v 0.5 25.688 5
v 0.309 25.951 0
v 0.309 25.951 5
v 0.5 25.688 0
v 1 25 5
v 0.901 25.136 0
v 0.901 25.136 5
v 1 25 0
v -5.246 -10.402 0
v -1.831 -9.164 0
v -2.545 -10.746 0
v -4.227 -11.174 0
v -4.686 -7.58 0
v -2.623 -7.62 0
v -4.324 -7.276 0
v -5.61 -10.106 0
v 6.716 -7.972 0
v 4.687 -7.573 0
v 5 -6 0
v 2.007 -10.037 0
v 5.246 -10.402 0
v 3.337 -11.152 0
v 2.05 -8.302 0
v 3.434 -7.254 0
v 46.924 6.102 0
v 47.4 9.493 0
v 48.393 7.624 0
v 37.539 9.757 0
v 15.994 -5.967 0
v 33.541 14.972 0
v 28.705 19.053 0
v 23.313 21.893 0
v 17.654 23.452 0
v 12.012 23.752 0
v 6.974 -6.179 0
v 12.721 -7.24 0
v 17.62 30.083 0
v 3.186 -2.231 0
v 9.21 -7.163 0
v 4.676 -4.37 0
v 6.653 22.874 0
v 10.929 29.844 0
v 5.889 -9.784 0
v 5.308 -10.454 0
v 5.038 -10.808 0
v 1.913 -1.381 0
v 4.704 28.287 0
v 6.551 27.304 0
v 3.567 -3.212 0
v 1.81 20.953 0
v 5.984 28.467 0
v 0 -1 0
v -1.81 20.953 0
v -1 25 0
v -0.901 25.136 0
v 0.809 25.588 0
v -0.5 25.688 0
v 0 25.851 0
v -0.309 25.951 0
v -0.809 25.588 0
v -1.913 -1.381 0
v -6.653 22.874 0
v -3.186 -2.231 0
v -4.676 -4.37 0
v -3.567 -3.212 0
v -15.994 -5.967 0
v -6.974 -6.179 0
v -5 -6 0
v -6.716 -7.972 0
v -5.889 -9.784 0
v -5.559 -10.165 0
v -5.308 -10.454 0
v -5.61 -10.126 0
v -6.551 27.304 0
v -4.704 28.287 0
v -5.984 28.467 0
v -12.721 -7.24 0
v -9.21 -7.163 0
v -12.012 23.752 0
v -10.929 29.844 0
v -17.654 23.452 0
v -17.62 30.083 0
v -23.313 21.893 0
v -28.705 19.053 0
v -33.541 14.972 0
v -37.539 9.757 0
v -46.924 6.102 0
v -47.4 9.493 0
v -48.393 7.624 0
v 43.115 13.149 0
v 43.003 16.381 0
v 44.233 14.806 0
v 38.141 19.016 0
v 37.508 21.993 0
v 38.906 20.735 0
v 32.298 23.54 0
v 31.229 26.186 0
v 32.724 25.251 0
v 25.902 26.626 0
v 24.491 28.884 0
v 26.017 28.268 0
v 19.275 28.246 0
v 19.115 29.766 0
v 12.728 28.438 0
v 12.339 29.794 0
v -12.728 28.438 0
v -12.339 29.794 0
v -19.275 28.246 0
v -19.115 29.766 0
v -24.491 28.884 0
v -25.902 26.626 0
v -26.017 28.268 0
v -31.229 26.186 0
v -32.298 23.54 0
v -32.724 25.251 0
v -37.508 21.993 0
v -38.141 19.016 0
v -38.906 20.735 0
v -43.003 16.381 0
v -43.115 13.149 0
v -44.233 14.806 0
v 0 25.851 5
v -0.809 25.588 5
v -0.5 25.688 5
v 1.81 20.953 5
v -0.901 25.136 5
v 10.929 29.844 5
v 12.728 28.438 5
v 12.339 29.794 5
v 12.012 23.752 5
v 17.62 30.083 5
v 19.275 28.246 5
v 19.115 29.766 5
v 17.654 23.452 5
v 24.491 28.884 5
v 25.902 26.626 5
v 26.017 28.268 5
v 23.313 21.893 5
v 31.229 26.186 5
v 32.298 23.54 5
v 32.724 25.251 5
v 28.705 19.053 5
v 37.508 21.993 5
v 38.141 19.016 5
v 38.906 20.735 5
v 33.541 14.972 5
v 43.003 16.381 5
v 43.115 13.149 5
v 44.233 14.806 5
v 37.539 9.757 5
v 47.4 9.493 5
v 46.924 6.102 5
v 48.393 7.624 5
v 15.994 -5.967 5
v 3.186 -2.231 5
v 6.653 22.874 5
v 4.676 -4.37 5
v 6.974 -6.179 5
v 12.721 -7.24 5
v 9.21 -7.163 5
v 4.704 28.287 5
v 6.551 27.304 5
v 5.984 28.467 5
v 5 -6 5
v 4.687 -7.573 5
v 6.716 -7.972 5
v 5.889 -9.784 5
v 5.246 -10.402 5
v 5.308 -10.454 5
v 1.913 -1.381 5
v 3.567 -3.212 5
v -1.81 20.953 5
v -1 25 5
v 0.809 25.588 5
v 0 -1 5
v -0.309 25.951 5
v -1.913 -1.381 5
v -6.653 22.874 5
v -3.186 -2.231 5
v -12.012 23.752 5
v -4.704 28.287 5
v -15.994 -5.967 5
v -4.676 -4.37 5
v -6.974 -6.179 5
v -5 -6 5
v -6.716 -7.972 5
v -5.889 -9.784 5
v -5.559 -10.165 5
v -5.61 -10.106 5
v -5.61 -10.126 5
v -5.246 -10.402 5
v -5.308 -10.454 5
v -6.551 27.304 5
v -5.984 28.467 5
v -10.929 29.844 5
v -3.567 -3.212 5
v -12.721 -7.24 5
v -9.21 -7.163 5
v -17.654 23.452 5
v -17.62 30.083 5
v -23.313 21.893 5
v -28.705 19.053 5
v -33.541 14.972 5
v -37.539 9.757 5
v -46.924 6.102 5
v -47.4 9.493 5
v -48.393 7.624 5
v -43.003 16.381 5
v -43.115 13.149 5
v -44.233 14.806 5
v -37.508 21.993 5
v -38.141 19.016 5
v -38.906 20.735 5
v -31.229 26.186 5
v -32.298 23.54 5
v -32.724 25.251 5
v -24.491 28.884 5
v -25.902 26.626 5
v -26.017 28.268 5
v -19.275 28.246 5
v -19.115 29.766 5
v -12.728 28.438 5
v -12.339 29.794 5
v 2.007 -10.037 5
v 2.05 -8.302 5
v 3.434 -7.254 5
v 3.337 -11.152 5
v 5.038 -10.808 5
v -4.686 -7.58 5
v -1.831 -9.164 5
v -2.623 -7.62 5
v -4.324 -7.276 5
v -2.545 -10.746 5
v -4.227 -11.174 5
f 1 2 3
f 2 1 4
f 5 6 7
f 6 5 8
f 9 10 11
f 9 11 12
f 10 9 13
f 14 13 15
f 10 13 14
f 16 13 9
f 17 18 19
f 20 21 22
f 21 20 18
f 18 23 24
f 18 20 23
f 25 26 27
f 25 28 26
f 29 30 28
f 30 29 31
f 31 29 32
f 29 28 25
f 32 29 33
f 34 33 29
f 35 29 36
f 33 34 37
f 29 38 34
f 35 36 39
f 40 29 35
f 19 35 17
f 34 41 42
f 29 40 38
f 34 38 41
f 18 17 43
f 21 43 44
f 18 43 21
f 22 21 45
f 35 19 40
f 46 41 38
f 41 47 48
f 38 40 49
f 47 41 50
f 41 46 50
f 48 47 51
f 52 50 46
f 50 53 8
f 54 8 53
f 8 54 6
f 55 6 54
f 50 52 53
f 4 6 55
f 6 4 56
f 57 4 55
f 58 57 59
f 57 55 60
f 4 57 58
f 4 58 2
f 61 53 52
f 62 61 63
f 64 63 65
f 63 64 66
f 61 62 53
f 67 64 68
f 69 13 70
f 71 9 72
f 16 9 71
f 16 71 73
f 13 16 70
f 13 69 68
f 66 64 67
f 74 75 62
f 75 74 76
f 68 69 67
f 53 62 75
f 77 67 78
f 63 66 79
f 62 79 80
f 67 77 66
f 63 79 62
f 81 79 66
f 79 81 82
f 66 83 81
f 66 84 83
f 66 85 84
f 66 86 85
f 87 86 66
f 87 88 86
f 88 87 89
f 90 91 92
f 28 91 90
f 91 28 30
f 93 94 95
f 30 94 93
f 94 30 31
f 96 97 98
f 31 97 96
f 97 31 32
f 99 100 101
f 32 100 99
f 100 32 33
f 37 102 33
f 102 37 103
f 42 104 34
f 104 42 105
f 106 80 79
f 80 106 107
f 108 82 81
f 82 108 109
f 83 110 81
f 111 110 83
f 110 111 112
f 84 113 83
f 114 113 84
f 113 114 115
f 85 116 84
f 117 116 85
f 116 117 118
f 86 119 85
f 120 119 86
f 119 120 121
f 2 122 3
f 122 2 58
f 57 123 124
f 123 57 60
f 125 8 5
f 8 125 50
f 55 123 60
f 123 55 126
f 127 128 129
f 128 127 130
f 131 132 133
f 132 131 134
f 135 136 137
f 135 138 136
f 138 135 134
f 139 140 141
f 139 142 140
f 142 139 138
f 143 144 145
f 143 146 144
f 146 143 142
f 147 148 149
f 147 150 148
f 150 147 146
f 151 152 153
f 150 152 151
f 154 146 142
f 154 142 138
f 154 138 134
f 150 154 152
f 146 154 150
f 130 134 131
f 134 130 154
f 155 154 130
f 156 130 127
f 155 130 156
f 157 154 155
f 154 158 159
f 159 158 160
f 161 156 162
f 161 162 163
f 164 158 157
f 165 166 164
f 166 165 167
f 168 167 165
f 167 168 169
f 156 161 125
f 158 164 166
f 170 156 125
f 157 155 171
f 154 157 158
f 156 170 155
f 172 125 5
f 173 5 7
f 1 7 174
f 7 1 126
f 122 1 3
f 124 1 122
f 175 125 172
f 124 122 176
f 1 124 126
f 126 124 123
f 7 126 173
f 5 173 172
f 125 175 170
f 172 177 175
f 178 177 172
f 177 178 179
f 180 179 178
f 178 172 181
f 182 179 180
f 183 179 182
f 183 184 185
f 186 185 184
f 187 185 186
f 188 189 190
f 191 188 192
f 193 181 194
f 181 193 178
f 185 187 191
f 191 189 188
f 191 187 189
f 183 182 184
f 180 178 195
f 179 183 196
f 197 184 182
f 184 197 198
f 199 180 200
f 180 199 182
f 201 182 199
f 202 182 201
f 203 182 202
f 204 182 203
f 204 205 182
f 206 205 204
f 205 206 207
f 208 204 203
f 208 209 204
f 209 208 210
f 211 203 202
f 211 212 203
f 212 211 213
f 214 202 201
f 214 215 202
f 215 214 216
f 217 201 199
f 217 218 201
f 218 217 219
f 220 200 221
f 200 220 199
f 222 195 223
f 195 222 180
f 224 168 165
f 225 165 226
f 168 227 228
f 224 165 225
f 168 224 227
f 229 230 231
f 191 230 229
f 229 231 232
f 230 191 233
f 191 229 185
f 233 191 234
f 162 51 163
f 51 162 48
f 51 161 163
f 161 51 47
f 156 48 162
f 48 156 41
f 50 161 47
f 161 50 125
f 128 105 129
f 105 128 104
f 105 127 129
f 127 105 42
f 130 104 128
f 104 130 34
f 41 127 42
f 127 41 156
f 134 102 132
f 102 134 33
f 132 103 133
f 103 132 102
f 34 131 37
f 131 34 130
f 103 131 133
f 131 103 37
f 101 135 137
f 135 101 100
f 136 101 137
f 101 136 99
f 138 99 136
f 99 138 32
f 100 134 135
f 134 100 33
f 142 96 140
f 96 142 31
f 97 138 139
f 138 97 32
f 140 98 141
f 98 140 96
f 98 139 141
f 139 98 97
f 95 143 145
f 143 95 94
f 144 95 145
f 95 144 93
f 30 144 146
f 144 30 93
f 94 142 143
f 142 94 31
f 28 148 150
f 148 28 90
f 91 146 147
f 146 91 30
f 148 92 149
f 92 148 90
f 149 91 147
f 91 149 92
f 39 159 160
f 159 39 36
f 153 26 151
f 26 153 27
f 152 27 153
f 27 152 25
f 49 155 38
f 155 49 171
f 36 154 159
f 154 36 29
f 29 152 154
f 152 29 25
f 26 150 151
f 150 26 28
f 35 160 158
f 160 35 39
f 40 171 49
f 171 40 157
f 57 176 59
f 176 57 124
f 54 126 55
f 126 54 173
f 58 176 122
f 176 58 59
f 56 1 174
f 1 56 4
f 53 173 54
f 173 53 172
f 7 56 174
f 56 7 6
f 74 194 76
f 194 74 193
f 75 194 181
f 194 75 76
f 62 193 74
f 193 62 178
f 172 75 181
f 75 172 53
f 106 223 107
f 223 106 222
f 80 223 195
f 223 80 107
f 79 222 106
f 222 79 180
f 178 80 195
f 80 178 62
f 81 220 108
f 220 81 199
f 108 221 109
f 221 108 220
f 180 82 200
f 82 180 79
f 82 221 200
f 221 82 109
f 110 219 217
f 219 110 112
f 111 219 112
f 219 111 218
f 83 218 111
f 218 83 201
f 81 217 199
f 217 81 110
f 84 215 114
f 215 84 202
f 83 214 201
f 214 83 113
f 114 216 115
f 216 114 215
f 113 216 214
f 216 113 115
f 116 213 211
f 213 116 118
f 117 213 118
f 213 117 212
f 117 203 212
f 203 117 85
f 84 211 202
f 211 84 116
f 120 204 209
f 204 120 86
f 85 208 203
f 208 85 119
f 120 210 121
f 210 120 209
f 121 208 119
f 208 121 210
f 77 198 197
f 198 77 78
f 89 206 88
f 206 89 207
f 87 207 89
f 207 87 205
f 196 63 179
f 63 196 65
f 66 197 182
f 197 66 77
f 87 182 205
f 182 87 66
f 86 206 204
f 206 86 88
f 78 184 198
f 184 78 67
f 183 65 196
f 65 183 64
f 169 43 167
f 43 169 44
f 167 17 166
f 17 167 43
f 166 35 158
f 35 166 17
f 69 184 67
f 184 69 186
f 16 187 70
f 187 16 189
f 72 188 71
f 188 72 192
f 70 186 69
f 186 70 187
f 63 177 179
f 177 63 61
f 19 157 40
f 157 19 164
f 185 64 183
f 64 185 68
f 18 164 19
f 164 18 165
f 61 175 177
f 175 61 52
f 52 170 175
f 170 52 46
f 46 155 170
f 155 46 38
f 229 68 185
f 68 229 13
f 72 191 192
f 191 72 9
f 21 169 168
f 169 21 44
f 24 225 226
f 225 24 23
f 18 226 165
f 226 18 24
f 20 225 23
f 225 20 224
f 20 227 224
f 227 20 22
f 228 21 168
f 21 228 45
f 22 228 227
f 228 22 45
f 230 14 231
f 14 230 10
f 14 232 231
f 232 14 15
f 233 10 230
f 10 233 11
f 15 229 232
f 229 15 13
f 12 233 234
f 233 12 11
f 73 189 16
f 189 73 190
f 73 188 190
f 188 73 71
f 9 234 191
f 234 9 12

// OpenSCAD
//Displays a 30cm long ruler
showruler = "no"; //["yes","no"]
rulerheight = 2; 
rulerlenght = 300; 

//Pattern-Element parameter 1
circle_1 = 5;//[1:100]
//Pattern-Element parameter 2
circle_2 = 1;//[1:100]
//Pattern-Element parameter 3
lenght = 20;//[1:100]
//Height of the moustache
height = 5;//[1:100]

//How often the element is repeated per side
repeat = 8;//[0:100]
//shift in x direction (10 = 1mm)(elementnumber*x)
shift_x = 2;//[-100:100]
//shift in y direction (10 = 1mm)(elementnumber*y)
shift_y = 5;//[-100:100]
//rotation of elements (elementnumber*rotation)
rotate = 10;//[0:360]
//scale of elements (elementnumber*scale)
scale =1;//[-100:100]


//Noseclip-Parameter: Angle the noseclip is open
noseclip_openingangle = 100;//[0:180]
//Noseclip-Parameter: diameter of the noseclip
noseclip_diameter = 10;//[0:180]
//Noseclip-Parameter: wallthickness of the noseclip
noseclip_wallthickness = 2;//[0:180]
//Noseclip-Parameter: radius of the little circles at the end of the noseclip
noseclip_endcircle = 2;//[0:180]
//Noseclip-Parameter: shift in x direction
noseclip_x = 0;//[-100:100]
//Noseclip-Parameter: shift in y direction
noseclip_y = -6;//[-100:100]

realshift_x = shift_x/10;
realshift_y = shift_y/10;
realscale = scale/10;





if(showruler == "yes"){
	ruler();
}
full(circle_1,circle_2,lenght,height);
noseclip();


module ruler(){
	translate([0,-noseclip_diameter,rulerheight + height]){
		difference(){
			cube([rulerlenght,10,rulerheight], center = true);
			for(i=[0:30]){
				translate([(i*10)-150,0,0]){
					cube([1,5,rulerheight+2], center = true);
				}
			}
		}
	}
}


module noseclip(){
translate([noseclip_x,noseclip_y,height/2]){
	difference(){
		union(){
			cylinder(h = height, r = noseclip_diameter/2+noseclip_wallthickness, center = true);
			
		}
		cylinder(h = height+2, r = noseclip_diameter/2, center = true);	
		rotate(180+90 + noseclip_openingangle/2) 
			linear_extrude(height = height+2, center = true)
				slice(noseclip_diameter*2, noseclip_openingangle);
	}
rotate(noseclip_openingangle/2) 
	translate([0,-noseclip_diameter/2,0]){
		cylinder(h = height, r = noseclip_endcircle, center = true);
	}

rotate(-noseclip_openingangle/2) 
	translate([0,-noseclip_diameter/2,0]){
		cylinder(h = height, r = noseclip_endcircle, center = true);
	}
}
}


module slice(r = 10, deg = 30) { 
	degn = (deg % 360 > 0) ? deg % 360 : deg % 360 + 360;
	difference() {
		circle(r);
		if (degn > 180) 
			intersection_for(a = [0, 180 - degn]) 
				rotate(a) 
					translate([-r, 0, 0]) 
						square(r * 2); 
		else 
			union() 
				for(a = [0, 180 - degn]) 
					rotate(a) 
						translate([-r, 0, 0]) 
							square(r * 2); 
	}
}

module full() {
	half(circle_1,circle_2,lenght,height);
	mirror([ 1, 0, 0 ])
		half(circle_1,circle_2,lenght,height);
}



module half() {
	for(i=[0:repeat]){
		translate([i*realshift_x,i* realshift_y, 0]){
			rotate([0,0,i*-rotate]){
				translate([-circle_1,0,0]){
					scale(v = [(i*realscale)+1,(i*realscale)+1, 1])
						element(circle_1,circle_2,lenght,height);
				}
			}
		}
	}
}


module element(circle_1,circle_2,lenght,height) {
 linear_extrude(height=height)
 	hull() {
 		translate([circle_1, circle_1, 0])
 			circle(r=circle_1,center = true);
 		translate([circle_1 ,  circle_1+ lenght, 0])
 			circle(r=circle_2,center = true);
 	}
}
